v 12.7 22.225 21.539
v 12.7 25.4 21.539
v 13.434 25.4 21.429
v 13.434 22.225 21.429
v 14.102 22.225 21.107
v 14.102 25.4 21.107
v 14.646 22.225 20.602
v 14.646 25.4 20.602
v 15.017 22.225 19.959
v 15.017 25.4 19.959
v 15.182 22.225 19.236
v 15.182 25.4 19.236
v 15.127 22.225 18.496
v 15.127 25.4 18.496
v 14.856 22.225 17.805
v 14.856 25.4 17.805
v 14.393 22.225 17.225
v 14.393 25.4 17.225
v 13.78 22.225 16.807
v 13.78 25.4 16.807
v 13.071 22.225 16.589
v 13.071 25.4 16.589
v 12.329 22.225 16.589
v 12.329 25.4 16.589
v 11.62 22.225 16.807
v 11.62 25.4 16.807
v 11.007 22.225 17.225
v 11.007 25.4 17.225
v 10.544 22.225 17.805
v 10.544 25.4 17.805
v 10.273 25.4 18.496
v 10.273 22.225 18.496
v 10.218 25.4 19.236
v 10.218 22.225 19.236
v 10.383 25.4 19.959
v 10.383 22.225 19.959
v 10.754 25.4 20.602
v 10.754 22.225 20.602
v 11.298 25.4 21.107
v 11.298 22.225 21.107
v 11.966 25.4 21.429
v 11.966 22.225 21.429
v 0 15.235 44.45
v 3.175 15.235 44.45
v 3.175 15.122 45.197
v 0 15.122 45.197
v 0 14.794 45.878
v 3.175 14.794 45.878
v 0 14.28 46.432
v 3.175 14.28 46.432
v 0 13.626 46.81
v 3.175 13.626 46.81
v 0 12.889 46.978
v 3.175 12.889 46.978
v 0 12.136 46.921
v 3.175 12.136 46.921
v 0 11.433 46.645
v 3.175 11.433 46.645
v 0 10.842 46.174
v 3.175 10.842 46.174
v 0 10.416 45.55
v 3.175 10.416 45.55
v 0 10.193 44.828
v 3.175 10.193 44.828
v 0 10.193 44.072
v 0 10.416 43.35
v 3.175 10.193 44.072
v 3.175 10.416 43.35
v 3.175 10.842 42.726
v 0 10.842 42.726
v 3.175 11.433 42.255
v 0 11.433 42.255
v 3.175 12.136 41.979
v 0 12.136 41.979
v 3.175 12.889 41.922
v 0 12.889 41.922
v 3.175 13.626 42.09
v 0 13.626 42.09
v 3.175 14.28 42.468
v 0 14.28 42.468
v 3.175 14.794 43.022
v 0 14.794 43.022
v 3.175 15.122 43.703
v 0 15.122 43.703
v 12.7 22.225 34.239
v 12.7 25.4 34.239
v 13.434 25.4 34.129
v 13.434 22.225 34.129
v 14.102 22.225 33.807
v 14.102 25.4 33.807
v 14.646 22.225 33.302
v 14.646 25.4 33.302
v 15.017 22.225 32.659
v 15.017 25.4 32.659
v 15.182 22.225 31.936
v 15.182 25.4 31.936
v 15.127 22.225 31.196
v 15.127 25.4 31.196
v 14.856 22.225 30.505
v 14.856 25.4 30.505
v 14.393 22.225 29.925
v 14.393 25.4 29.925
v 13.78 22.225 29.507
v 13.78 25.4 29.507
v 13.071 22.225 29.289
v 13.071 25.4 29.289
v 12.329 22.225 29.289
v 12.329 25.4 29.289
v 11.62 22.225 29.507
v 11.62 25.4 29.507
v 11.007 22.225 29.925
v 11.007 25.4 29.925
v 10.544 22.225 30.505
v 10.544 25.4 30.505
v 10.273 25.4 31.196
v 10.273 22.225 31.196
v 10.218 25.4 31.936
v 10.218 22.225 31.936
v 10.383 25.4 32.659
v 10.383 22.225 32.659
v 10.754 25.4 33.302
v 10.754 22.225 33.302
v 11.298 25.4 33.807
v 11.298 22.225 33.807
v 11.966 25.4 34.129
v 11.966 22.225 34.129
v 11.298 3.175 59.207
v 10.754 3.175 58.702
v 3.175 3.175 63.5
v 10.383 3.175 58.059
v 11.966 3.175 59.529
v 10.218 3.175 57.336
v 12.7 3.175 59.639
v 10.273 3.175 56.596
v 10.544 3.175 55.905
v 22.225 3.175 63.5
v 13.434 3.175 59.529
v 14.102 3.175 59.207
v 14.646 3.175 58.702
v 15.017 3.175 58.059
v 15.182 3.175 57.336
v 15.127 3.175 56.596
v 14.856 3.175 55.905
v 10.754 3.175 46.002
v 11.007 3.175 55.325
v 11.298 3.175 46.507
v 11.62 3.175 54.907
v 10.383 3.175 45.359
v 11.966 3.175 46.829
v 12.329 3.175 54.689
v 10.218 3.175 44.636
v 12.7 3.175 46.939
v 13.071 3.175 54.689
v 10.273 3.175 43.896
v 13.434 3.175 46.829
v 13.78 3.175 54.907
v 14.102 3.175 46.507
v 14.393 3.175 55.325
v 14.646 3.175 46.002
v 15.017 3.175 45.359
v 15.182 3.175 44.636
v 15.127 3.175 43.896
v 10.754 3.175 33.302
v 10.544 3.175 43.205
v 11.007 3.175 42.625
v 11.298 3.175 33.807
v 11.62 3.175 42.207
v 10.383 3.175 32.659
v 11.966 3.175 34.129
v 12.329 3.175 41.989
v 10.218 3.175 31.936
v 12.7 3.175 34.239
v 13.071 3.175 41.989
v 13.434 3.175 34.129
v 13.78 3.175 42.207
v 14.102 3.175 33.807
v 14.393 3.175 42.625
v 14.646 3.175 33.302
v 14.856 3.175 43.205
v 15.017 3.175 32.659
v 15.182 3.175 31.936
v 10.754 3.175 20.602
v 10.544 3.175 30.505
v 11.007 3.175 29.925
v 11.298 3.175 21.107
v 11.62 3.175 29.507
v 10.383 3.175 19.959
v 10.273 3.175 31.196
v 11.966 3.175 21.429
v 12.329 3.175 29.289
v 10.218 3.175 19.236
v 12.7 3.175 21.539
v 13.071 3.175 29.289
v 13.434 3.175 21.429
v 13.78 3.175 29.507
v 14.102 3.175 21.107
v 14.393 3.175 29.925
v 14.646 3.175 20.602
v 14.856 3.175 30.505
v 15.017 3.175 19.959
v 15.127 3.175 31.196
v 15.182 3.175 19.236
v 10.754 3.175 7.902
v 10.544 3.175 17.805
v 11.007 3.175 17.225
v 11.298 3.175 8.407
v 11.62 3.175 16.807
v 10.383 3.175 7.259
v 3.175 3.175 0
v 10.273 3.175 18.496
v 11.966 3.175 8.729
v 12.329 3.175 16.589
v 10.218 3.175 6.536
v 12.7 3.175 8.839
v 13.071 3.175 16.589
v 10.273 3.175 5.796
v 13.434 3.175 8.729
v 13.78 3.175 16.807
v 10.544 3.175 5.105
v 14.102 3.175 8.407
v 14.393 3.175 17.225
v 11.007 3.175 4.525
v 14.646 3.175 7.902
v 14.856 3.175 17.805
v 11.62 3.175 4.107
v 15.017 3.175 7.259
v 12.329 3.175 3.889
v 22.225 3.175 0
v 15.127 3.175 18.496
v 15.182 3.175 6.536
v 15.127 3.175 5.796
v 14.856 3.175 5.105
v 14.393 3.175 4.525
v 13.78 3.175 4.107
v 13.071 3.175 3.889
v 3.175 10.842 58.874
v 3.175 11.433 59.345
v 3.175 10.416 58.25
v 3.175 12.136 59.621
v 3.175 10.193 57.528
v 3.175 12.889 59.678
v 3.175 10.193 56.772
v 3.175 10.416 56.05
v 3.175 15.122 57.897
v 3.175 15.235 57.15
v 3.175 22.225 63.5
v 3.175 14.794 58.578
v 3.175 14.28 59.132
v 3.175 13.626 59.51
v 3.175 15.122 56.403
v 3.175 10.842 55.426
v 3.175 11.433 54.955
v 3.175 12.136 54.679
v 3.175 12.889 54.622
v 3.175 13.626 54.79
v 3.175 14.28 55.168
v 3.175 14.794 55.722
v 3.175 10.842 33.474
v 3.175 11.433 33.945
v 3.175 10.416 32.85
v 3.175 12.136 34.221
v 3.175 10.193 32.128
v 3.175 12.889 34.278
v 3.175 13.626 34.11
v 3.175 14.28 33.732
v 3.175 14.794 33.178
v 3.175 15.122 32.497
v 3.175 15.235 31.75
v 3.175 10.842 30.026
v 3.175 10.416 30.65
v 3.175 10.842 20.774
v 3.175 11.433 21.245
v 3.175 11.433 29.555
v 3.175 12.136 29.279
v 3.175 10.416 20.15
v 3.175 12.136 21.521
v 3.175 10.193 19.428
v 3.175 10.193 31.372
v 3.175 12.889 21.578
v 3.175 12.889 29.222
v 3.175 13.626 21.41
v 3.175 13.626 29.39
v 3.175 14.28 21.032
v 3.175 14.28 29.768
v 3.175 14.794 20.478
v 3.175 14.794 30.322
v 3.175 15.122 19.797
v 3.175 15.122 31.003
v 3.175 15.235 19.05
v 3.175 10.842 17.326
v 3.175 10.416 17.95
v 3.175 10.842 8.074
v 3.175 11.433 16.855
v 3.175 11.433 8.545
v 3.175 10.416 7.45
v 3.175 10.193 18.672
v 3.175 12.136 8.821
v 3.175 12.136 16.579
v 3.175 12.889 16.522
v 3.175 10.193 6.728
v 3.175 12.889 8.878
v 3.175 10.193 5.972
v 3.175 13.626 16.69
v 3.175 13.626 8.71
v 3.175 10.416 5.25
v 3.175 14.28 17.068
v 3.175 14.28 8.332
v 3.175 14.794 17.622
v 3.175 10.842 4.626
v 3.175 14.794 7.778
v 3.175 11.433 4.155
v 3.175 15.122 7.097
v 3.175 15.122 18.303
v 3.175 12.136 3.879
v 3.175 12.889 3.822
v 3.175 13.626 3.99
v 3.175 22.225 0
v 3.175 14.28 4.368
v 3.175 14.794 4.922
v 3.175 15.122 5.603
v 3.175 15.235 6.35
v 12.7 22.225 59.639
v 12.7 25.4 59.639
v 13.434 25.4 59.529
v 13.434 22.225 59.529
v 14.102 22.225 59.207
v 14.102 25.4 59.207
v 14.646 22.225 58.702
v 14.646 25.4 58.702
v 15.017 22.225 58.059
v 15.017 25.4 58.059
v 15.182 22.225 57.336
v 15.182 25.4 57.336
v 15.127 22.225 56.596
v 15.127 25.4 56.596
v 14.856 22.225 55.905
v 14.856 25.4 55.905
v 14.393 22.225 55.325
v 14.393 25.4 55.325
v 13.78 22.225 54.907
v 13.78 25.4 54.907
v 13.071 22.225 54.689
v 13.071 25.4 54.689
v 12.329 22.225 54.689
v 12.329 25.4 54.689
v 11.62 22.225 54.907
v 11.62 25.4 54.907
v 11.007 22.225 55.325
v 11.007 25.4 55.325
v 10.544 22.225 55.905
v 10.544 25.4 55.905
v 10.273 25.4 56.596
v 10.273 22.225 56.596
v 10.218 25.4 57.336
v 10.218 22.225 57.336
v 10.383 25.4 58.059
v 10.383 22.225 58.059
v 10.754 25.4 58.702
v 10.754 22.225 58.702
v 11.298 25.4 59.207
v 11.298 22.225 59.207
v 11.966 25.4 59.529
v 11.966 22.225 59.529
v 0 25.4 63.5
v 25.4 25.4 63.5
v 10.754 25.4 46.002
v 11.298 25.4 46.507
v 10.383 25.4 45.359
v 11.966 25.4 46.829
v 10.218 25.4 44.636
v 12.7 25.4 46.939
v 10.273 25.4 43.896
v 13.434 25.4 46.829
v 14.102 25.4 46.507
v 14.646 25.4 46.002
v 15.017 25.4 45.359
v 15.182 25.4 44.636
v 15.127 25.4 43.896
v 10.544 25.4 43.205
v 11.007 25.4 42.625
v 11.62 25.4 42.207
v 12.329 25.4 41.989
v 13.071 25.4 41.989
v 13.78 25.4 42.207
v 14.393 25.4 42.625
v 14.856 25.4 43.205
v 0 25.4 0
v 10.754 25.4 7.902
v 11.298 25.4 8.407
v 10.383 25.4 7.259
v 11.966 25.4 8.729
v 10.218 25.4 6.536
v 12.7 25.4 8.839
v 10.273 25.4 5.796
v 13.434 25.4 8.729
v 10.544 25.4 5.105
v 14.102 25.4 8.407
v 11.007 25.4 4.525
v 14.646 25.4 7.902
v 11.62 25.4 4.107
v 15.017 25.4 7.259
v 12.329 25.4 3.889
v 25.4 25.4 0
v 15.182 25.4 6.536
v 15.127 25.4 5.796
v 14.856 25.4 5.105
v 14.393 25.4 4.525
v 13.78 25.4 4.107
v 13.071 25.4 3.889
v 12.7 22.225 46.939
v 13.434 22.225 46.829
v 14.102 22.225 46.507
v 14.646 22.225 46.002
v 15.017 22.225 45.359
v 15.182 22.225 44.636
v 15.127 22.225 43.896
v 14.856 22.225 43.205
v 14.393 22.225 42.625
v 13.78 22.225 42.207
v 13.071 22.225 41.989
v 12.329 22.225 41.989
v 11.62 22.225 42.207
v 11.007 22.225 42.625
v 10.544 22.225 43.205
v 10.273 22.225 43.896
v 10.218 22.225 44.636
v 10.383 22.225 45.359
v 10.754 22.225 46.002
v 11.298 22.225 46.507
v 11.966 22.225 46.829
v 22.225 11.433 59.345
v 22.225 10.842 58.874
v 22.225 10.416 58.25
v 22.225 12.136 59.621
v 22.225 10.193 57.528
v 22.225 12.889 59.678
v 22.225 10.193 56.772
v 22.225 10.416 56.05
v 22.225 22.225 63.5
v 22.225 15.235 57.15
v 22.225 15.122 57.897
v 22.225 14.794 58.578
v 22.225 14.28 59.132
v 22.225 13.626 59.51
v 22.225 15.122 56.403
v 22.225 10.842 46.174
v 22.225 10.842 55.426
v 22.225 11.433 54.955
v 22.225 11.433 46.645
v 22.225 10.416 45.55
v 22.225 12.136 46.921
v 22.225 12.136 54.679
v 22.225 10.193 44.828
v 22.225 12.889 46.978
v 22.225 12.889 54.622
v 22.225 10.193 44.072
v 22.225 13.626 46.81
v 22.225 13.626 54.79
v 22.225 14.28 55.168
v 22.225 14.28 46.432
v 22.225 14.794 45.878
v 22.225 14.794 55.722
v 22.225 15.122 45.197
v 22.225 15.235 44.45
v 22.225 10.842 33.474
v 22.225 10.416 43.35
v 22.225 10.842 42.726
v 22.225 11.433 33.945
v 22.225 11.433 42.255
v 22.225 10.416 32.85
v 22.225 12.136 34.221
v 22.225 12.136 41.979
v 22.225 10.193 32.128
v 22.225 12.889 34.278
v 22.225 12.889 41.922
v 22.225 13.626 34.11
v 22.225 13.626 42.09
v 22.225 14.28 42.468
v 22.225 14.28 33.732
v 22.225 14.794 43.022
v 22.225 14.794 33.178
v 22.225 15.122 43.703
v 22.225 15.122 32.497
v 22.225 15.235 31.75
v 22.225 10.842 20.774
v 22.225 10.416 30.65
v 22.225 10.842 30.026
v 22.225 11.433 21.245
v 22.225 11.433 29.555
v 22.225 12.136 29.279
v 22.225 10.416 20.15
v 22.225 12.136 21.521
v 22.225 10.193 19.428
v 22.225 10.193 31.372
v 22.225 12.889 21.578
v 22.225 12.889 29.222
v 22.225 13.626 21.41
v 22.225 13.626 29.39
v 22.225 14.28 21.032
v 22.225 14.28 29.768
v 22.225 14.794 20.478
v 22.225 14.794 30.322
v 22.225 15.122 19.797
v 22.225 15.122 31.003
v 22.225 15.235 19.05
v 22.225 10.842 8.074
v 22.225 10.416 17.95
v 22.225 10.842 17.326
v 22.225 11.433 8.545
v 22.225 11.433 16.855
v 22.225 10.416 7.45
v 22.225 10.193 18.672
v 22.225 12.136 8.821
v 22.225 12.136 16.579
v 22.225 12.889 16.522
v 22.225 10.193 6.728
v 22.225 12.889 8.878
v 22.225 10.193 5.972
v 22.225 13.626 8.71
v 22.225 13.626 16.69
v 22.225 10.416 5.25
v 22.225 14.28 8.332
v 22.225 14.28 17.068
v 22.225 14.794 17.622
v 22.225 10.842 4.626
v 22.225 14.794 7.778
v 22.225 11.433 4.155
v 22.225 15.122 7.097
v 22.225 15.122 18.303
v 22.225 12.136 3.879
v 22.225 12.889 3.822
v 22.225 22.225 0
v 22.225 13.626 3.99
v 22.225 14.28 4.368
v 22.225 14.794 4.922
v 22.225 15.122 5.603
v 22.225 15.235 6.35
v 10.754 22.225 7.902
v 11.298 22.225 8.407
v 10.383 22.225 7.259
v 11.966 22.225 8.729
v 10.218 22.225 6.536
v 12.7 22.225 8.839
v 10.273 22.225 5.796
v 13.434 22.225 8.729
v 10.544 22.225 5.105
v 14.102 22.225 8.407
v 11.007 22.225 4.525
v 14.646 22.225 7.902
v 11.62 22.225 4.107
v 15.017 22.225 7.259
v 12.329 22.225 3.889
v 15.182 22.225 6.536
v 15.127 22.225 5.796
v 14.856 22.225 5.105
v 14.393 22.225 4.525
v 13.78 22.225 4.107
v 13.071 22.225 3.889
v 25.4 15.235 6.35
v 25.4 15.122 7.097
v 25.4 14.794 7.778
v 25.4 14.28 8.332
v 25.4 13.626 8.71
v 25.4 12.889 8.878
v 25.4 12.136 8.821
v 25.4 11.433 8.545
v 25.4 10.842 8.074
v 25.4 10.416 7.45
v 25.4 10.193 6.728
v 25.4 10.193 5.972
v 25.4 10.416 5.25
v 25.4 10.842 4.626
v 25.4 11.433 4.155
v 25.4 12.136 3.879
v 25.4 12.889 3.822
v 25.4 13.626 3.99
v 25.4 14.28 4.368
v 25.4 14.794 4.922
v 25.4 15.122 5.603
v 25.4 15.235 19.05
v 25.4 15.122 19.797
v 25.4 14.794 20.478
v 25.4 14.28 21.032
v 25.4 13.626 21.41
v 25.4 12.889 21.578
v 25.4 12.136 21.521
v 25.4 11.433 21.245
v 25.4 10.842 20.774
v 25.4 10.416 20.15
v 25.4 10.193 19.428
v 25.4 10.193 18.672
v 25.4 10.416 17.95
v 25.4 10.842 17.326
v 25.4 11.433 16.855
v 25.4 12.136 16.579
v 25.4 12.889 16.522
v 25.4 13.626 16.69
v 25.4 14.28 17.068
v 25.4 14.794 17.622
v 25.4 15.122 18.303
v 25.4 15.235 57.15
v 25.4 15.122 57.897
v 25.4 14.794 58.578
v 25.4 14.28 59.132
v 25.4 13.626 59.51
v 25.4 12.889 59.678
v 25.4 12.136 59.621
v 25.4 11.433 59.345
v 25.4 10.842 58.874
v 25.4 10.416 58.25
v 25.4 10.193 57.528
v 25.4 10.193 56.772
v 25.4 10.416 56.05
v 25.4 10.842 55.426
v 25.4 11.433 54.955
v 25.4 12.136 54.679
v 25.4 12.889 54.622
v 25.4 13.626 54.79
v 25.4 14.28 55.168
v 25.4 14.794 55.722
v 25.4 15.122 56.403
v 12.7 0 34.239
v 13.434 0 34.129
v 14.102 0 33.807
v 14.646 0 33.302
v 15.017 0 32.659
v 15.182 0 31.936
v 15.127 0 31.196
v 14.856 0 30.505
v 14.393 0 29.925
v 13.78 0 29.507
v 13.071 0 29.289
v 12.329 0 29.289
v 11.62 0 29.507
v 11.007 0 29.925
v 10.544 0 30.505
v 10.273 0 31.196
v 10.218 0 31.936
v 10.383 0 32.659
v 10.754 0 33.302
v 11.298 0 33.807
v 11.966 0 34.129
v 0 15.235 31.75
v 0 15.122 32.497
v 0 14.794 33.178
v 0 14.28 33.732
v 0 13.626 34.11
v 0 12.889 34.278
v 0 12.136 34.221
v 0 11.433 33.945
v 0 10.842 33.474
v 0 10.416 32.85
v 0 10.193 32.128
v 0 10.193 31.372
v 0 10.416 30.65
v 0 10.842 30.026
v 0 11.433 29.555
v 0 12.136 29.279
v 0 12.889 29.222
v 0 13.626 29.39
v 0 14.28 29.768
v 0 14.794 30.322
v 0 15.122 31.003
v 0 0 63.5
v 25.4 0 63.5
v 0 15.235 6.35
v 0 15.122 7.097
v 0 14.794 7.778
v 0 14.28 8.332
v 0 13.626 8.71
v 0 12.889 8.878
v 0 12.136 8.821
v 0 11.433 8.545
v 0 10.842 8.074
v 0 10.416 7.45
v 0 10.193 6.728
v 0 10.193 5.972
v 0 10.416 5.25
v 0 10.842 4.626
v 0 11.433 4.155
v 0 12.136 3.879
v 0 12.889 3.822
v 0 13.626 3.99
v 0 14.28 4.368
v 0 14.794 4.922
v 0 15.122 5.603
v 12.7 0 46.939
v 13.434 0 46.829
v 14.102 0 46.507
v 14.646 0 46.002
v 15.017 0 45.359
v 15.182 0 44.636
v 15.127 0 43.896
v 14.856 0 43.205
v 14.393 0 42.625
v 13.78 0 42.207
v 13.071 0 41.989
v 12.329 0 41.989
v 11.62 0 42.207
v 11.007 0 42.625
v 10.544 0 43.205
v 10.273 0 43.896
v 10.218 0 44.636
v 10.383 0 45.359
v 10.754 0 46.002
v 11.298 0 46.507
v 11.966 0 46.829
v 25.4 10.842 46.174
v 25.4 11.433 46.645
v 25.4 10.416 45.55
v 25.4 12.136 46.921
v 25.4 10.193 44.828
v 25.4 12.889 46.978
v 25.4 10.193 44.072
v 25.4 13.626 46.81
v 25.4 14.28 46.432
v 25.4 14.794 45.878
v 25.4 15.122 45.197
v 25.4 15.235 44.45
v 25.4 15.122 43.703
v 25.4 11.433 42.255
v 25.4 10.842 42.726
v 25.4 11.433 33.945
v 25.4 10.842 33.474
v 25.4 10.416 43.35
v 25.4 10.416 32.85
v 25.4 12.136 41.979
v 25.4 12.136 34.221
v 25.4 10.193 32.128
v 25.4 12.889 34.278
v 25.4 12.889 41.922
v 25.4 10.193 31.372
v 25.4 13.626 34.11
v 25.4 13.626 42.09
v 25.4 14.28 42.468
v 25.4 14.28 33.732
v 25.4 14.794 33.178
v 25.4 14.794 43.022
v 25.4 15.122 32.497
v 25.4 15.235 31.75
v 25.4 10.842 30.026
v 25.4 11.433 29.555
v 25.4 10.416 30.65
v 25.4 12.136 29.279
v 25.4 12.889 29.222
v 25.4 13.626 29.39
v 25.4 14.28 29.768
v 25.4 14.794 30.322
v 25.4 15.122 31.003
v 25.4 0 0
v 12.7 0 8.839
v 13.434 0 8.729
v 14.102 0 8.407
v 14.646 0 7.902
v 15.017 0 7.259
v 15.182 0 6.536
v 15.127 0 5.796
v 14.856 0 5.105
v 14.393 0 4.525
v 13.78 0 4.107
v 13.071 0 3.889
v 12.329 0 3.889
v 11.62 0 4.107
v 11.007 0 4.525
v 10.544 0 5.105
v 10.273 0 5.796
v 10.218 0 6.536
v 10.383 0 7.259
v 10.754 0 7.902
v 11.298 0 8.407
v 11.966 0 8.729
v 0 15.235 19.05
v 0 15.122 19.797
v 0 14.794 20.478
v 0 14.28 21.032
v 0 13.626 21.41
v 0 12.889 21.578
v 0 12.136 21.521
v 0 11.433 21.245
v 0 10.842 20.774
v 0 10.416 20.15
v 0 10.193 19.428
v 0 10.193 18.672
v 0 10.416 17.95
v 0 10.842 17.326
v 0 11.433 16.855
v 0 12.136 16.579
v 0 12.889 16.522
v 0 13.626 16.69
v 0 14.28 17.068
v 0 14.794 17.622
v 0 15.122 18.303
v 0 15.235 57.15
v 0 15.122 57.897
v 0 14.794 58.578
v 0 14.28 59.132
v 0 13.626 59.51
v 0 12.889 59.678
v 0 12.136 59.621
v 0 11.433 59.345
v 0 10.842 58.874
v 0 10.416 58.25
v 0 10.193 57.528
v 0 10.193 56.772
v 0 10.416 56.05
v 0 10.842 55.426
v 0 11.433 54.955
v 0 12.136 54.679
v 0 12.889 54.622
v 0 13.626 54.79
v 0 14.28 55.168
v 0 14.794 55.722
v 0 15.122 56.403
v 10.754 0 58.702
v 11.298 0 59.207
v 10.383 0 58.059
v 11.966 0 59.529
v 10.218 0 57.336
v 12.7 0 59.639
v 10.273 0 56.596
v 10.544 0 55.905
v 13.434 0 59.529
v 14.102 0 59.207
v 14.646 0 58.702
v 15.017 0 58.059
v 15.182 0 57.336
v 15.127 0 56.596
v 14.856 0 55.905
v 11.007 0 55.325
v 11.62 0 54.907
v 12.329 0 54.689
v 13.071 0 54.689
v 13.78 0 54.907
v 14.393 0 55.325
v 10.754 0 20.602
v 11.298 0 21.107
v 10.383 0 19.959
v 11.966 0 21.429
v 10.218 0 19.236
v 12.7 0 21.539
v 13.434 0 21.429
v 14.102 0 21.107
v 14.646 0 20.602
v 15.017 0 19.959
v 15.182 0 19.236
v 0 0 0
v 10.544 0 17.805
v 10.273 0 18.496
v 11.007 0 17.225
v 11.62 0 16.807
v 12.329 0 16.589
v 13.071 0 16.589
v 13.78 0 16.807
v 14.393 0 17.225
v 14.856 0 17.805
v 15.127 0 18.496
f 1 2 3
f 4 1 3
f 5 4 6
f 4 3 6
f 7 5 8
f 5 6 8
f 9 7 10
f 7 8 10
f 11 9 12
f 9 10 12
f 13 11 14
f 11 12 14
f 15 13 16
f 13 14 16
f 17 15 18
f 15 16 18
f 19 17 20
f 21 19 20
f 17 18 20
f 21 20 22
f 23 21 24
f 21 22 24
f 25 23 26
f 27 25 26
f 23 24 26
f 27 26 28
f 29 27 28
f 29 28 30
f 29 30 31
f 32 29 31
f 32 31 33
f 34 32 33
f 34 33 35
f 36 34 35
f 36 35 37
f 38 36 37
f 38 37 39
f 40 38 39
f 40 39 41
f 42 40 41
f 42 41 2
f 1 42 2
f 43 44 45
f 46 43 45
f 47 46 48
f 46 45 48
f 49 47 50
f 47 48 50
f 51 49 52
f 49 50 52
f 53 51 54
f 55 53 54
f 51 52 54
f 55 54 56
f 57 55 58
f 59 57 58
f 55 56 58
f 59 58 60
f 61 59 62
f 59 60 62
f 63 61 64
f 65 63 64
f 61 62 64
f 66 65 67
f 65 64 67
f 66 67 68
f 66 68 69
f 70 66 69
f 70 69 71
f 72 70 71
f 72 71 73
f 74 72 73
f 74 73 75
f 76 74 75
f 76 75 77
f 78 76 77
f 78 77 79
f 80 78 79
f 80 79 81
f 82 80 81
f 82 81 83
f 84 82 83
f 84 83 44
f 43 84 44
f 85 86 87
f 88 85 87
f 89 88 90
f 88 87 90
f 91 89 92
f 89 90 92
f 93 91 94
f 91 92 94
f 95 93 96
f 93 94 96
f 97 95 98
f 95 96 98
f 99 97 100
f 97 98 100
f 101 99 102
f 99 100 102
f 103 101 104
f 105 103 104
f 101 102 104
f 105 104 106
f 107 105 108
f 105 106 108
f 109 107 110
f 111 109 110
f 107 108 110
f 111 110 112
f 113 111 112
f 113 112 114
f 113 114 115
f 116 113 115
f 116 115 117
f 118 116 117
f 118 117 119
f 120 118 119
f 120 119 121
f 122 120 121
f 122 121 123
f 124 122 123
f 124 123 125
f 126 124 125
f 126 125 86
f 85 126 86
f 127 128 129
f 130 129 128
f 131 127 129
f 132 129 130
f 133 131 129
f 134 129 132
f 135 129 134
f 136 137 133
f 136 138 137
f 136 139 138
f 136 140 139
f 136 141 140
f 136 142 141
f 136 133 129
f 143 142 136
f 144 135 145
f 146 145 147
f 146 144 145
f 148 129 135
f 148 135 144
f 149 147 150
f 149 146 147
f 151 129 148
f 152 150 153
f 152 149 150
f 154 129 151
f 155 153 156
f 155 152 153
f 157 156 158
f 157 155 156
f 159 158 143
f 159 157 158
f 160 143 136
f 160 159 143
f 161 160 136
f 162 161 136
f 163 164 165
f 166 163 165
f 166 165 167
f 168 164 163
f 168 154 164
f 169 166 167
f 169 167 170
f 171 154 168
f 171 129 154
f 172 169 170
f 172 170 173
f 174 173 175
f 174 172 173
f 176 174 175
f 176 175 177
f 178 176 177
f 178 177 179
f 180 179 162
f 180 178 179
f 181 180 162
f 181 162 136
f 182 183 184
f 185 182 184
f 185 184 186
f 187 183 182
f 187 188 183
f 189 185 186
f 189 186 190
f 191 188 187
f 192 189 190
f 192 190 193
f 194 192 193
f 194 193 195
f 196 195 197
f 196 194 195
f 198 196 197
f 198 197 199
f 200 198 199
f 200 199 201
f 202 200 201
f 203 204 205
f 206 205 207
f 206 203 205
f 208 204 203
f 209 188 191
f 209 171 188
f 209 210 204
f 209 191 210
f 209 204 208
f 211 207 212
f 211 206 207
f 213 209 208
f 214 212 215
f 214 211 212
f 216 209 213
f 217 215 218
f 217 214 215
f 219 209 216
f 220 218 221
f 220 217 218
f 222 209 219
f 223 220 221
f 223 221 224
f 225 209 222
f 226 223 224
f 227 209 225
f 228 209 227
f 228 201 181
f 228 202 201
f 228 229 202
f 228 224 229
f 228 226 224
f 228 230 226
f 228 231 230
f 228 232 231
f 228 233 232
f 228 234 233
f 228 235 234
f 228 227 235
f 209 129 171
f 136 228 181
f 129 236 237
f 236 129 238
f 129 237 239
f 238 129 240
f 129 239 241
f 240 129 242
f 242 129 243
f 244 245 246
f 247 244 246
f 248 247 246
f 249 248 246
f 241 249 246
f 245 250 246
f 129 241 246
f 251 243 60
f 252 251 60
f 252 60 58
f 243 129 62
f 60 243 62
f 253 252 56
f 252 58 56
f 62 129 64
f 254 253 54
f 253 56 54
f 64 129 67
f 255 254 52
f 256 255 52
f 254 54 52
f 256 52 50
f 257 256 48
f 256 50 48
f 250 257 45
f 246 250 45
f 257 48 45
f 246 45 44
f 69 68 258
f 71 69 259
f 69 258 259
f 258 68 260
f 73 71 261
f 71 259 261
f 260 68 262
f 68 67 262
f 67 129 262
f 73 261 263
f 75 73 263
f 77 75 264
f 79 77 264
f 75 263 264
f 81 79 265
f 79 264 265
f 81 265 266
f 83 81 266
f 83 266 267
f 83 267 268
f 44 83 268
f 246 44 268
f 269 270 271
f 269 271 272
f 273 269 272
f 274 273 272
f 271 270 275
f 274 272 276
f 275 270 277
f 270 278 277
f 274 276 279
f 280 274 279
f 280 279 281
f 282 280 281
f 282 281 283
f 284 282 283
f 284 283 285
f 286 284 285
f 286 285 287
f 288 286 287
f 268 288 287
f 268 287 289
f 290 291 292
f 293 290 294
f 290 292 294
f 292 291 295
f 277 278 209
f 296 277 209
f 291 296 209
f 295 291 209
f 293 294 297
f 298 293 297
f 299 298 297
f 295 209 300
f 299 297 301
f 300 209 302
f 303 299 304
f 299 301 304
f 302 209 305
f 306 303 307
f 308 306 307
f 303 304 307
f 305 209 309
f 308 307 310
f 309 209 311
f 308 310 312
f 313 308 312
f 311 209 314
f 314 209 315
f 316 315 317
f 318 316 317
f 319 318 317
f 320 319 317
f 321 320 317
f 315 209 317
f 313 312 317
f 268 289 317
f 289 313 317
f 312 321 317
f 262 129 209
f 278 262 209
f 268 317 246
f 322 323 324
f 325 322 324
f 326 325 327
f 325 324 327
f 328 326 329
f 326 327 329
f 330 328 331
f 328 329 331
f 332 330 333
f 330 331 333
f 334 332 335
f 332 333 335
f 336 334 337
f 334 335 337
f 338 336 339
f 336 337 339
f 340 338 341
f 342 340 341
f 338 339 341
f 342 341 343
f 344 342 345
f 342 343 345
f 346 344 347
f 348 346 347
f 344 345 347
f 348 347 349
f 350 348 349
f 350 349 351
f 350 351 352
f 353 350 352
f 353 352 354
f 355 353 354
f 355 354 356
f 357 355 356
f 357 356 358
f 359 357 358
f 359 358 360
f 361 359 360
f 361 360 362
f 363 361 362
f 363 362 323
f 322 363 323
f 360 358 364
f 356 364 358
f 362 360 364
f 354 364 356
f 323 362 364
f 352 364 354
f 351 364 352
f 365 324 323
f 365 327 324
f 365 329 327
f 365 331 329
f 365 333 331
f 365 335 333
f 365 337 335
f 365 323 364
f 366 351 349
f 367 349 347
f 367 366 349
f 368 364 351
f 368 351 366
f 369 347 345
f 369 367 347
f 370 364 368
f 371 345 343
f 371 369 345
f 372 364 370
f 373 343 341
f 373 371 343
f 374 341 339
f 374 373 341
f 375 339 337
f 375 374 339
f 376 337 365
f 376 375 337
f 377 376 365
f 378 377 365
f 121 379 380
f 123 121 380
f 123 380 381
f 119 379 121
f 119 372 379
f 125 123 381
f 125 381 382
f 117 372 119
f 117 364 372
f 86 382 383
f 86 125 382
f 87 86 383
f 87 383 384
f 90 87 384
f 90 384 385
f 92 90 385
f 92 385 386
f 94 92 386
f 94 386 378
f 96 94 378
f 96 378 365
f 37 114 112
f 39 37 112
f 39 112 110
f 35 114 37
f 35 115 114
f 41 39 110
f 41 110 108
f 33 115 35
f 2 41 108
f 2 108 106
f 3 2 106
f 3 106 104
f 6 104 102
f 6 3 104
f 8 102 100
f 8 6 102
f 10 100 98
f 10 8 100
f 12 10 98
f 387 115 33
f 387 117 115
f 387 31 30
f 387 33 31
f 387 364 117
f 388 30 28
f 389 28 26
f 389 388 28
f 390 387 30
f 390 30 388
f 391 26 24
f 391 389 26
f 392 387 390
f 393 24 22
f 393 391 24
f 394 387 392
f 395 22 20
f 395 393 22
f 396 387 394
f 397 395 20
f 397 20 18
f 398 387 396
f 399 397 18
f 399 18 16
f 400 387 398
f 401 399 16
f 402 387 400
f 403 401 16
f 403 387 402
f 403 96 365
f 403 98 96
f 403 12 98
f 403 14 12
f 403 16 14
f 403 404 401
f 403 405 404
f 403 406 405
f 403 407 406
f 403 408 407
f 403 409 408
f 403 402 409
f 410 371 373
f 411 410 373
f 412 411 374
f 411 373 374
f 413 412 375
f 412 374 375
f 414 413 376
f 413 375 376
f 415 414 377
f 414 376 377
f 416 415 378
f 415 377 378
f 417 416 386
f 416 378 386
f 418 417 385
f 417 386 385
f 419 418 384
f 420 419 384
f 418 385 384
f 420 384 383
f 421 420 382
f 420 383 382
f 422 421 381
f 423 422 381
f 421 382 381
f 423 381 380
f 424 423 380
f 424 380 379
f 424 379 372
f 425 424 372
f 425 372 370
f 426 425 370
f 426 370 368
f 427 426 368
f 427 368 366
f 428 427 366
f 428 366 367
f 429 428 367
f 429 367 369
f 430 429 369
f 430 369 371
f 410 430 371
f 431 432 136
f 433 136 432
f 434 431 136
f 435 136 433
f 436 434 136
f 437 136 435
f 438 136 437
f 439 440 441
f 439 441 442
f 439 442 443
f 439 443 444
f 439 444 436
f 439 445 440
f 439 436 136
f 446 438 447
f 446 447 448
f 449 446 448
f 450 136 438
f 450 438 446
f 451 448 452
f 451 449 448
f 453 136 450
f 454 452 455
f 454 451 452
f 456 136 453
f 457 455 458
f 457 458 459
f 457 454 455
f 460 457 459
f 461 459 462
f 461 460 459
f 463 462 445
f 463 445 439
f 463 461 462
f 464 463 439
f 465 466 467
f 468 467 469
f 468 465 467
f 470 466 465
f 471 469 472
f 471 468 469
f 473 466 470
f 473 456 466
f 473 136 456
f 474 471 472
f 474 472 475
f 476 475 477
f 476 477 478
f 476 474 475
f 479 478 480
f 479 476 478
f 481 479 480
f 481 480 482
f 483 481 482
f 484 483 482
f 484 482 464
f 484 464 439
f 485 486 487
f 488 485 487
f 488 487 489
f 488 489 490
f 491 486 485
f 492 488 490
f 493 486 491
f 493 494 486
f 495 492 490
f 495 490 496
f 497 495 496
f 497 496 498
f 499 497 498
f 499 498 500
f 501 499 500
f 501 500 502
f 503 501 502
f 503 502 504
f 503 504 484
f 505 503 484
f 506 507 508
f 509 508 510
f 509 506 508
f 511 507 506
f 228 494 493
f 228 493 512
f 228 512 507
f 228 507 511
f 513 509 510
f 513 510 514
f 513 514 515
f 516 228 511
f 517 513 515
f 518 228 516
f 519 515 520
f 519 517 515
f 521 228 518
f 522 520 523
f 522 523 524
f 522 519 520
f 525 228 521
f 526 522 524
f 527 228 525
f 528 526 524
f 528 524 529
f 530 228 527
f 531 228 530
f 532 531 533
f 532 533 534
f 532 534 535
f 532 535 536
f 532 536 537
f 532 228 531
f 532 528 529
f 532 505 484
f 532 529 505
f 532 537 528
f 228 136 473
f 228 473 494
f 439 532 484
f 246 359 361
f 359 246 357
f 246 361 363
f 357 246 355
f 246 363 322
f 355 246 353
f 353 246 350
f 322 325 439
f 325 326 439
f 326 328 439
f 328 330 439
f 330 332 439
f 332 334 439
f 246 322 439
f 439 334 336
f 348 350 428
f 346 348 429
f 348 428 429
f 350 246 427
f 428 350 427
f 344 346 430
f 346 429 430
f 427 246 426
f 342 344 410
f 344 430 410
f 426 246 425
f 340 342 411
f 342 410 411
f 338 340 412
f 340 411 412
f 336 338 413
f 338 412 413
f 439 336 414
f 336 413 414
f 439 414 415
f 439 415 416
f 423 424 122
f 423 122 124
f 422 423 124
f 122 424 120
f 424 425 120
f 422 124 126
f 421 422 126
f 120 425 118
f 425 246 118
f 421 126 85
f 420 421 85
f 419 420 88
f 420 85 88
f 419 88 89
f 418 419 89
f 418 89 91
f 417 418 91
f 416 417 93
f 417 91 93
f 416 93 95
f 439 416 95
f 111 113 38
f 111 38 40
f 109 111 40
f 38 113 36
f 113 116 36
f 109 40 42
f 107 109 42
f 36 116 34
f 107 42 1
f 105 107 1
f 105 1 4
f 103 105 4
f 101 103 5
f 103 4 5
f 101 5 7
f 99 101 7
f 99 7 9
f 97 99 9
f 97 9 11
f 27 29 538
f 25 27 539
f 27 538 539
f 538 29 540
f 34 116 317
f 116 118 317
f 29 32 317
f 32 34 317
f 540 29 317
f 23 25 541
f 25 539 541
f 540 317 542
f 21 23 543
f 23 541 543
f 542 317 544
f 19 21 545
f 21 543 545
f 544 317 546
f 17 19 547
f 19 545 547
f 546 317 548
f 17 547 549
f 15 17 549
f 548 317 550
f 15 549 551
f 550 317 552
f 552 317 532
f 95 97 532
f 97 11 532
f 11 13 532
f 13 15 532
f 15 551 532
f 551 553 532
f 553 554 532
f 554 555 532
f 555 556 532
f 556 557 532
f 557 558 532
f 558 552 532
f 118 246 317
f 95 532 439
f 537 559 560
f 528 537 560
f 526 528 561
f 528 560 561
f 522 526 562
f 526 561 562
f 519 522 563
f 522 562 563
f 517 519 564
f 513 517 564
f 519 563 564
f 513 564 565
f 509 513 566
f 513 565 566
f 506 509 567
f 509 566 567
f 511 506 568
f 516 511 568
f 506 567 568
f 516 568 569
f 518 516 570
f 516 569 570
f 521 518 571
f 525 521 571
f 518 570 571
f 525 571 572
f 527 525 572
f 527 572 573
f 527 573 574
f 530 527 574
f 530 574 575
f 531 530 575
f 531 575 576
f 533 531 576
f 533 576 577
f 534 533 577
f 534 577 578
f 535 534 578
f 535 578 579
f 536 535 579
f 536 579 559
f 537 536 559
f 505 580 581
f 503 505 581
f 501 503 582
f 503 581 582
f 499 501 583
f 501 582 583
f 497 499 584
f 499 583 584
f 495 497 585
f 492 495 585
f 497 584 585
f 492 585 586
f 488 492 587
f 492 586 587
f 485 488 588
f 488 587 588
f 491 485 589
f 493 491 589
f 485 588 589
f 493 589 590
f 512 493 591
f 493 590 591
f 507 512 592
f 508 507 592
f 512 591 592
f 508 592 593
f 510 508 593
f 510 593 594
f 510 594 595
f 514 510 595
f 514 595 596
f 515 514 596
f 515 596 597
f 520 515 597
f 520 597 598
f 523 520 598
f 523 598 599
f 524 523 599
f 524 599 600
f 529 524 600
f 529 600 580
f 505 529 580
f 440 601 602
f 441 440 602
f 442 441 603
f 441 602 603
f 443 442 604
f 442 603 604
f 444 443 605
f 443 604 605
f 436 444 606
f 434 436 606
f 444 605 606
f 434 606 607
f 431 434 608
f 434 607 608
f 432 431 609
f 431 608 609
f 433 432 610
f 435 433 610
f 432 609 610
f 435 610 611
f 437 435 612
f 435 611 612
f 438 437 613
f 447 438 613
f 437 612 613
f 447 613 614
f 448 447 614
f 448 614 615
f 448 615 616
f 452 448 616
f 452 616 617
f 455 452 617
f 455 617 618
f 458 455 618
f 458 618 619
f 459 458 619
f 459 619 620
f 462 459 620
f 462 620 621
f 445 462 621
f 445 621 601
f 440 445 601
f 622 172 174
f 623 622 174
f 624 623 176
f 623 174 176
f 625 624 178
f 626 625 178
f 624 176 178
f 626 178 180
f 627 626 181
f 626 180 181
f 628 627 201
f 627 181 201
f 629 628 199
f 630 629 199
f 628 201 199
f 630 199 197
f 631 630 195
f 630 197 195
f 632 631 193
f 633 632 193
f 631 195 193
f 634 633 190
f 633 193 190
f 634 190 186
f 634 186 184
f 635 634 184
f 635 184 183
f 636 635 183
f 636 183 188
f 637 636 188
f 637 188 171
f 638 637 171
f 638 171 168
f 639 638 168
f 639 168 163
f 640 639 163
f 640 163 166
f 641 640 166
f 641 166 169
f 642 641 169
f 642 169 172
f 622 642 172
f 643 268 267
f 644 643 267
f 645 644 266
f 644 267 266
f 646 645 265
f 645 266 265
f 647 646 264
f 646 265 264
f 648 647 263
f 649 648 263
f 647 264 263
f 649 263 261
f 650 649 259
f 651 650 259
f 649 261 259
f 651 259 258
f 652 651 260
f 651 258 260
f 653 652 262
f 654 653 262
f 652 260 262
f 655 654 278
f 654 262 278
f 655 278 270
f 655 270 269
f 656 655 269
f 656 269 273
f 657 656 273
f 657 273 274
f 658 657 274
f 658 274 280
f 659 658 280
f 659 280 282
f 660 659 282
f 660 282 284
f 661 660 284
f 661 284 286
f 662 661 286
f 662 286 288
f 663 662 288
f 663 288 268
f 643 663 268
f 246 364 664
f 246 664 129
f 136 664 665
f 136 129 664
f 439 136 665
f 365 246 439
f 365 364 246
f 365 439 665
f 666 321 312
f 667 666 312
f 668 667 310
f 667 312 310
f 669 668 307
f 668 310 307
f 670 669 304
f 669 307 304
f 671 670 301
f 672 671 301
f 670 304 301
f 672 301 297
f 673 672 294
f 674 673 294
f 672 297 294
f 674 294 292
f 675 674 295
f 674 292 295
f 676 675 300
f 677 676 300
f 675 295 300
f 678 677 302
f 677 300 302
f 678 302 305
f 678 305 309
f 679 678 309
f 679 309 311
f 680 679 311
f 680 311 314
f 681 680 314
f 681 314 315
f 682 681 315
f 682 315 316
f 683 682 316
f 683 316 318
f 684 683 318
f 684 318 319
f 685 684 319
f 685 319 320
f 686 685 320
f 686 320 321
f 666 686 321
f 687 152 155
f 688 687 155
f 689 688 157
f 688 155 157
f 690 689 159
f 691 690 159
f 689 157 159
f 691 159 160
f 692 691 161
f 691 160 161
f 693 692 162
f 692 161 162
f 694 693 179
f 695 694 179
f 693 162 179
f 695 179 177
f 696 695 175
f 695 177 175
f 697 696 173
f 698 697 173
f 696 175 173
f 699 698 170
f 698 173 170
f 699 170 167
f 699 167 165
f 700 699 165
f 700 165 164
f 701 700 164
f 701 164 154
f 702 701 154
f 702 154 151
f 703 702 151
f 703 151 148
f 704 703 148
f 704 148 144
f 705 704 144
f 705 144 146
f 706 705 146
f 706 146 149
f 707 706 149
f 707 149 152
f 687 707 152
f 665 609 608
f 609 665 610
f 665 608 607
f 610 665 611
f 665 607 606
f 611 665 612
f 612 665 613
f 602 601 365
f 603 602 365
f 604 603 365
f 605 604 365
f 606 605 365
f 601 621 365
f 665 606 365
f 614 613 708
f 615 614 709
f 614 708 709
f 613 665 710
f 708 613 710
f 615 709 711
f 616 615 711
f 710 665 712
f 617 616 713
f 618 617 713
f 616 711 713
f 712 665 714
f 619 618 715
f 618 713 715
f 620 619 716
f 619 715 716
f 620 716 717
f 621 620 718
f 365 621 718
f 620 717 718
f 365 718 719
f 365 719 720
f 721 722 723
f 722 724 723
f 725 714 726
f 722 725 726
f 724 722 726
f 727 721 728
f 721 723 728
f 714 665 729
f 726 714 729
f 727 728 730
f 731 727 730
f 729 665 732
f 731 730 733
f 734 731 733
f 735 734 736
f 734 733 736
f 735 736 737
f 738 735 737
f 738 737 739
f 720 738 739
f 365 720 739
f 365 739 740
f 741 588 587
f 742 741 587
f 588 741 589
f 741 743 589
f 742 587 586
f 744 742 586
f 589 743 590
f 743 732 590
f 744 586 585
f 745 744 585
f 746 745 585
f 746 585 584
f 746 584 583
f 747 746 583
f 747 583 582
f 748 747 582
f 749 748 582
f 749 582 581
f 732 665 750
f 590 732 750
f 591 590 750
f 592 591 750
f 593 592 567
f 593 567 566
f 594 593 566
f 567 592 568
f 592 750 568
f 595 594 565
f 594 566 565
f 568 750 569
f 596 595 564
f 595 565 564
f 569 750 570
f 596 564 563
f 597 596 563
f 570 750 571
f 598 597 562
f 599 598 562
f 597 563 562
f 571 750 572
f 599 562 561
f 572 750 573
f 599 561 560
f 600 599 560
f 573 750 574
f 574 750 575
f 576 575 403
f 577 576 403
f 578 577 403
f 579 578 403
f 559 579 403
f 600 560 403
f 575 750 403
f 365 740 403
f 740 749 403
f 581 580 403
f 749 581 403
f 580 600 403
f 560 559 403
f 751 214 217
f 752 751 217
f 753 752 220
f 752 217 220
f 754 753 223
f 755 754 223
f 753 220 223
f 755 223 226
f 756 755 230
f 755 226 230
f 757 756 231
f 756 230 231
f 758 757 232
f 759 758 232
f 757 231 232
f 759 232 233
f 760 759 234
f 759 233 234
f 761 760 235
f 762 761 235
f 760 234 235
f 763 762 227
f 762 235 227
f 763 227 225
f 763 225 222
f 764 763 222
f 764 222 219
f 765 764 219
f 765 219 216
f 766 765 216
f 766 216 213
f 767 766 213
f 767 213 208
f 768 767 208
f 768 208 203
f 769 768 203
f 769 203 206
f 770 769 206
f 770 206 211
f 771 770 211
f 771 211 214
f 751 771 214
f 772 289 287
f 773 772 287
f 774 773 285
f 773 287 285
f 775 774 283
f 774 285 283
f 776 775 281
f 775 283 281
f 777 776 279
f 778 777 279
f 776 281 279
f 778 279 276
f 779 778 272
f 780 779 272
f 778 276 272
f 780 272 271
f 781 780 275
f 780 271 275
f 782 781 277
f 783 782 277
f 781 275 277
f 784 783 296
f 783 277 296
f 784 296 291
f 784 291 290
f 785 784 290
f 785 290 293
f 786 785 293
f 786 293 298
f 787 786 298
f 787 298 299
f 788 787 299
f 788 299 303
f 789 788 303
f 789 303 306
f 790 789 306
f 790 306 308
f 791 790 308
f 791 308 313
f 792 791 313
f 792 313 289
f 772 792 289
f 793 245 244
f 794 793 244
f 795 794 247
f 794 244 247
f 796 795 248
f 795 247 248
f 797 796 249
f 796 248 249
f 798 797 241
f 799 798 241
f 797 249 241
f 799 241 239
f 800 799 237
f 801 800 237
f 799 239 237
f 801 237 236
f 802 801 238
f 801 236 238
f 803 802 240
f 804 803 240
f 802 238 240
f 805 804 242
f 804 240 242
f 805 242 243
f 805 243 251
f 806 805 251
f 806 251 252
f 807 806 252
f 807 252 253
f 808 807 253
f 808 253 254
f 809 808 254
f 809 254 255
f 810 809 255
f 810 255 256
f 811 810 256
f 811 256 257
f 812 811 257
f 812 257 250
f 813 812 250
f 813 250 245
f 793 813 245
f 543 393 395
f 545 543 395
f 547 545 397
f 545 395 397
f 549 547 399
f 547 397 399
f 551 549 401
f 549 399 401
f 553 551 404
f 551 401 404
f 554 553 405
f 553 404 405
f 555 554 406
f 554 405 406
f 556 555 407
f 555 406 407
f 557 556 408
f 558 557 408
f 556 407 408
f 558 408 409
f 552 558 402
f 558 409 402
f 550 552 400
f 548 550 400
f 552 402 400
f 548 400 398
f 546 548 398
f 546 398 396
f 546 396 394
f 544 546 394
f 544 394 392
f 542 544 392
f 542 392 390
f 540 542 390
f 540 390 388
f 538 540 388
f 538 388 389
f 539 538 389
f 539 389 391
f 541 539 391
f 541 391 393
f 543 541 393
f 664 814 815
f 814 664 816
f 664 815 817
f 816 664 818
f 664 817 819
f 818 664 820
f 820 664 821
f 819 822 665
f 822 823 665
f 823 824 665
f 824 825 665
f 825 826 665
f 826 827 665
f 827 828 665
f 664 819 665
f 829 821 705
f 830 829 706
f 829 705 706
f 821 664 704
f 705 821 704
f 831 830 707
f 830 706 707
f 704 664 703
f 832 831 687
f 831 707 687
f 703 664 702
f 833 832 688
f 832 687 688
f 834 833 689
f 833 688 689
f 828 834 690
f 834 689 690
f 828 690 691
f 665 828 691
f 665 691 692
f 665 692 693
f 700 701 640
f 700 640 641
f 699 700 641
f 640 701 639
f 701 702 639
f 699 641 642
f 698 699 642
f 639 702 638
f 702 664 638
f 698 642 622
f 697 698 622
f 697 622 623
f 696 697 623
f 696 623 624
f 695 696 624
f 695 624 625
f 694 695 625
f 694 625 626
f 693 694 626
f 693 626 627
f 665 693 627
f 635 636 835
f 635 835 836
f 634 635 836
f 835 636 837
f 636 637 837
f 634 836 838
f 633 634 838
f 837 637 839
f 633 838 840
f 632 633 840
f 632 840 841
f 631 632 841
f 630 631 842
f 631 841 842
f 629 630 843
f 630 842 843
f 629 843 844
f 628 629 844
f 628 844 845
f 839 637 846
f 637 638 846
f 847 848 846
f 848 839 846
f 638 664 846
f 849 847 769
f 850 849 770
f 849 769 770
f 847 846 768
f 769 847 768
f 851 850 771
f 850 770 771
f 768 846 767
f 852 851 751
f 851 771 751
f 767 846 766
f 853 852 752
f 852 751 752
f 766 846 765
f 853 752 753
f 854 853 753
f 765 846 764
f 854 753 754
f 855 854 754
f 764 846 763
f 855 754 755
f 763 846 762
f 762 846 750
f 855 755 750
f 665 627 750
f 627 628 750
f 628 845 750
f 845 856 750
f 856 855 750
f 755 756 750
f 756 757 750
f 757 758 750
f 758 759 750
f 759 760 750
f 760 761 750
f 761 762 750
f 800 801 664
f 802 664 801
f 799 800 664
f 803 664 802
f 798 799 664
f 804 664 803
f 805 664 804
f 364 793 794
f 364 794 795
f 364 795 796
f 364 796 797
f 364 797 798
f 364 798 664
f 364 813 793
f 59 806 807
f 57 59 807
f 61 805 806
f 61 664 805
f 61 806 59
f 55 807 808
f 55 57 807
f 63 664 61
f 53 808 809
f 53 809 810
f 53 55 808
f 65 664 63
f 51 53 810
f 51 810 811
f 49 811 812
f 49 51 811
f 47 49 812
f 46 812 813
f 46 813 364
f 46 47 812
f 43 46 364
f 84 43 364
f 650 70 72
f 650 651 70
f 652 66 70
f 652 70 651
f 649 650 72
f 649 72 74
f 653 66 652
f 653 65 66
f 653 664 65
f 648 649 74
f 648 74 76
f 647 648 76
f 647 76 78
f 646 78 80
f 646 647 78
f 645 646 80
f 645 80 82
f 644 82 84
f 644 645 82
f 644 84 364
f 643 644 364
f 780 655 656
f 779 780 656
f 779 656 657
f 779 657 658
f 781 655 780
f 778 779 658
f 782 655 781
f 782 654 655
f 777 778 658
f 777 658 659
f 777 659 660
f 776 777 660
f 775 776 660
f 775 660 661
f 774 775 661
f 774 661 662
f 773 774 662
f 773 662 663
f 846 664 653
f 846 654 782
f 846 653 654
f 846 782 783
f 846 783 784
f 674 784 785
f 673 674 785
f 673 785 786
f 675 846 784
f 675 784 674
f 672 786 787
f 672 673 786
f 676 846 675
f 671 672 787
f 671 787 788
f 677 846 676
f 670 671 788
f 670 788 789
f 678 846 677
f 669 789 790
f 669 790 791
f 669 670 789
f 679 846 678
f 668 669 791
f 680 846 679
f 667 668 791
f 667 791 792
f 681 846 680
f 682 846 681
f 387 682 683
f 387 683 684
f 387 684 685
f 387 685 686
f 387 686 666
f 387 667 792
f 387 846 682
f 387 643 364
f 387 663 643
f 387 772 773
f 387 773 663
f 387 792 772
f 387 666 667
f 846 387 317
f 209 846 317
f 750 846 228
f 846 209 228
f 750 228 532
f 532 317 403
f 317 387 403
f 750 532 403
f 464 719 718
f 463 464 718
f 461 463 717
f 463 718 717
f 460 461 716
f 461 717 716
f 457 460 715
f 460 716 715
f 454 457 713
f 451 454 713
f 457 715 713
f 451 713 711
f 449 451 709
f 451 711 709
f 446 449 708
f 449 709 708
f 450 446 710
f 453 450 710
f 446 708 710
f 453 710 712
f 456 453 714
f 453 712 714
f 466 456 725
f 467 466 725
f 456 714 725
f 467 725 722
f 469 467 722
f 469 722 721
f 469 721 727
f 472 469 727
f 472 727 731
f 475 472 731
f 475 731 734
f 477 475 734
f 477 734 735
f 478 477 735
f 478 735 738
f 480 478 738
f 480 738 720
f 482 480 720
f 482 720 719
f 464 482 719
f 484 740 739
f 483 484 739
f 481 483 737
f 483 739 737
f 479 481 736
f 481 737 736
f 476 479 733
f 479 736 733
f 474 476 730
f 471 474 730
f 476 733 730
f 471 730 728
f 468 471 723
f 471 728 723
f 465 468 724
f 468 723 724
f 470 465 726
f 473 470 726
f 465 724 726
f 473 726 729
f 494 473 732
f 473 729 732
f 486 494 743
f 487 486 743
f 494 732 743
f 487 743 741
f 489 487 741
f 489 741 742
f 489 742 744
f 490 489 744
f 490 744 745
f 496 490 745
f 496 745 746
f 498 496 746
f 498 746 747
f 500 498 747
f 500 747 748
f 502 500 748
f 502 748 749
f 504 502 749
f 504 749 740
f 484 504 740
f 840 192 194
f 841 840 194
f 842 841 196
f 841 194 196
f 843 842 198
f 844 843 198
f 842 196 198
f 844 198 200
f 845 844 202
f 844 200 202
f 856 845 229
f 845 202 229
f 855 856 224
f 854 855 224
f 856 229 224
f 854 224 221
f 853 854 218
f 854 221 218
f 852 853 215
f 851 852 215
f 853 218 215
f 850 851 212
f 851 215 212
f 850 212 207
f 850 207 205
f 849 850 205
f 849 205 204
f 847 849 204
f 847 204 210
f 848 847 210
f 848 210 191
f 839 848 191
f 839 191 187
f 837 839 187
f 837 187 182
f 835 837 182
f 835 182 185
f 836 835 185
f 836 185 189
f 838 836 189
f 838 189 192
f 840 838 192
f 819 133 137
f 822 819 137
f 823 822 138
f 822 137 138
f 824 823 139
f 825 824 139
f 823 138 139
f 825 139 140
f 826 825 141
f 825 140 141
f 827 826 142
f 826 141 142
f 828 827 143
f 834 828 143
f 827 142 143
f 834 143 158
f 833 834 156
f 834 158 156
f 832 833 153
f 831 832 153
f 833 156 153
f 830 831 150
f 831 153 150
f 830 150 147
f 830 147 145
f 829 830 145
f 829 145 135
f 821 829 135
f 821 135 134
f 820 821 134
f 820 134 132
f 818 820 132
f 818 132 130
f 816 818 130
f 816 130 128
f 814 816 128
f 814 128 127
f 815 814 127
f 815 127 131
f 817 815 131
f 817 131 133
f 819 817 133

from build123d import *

# Parameters (mm, degrees)
SKETCH1_W           = 25.4
SKETCH1_H           = 25.4
BOSS_EXTRUDE1_DEPTH = 63.5
SHELL1_T            = -3.175
SKETCH2_R           = 2.4892
CUT_EXTRUDE1_DEPTH  = 63.5
SKETCH3_R           = 2.53492
CUT_EXTRUDE2_DEPTH  = 63.5


with BuildPart() as part:
    # Sketch1 → Boss-Extrude1 (new body)
    with BuildSketch(Plane.XY):
        with Locations((12.7, 12.7)):
            Rectangle(SKETCH1_W, SKETCH1_H)
    extrude(amount=BOSS_EXTRUDE1_DEPTH)

    # Shell1
    shell1_openings = [part.faces().sort_by_distance(p)[0] for p in [
        (12.7, 12.7, 63.5),
        (12.7, 12.7, 0),
    ]]
    offset(amount=SHELL1_T, openings=shell1_openings, kind=Kind.INTERSECTION)

    # Sketch2 → Cut-Extrude1 (cut)
    with BuildSketch(Plane(origin=(0, 25.4, 0), x_dir=(1, 0, 0), z_dir=(0, 1, 0))):
        with Locations(Location((12.7, -6.35, 0), (0, 0, 270))):
            Circle(SKETCH2_R)
        with Locations(Location((12.7, -19.05, 0), (0, 0, 270))):
            Circle(SKETCH2_R)
        with Locations(Location((12.7, -31.75, 0), (0, 0, 270))):
            Circle(SKETCH2_R)
        with Locations(Location((12.7, -44.45, 0), (0, 0, 270))):
            Circle(SKETCH2_R)
        with Locations(Location((12.7, -57.15, 0), (0, 0, 270))):
            Circle(SKETCH2_R)
    extrude(amount=-CUT_EXTRUDE1_DEPTH, mode=Mode.SUBTRACT)

    # Sketch3 → Cut-Extrude2 (cut)
    with BuildSketch(Plane(origin=(25.4, 0, 0), x_dir=(0, 0, -1), z_dir=(1, 0, 0))):
        with Locations(Location((-57.15, 12.7, 0), (0, 0, 90))):
            Circle(SKETCH3_R)
        with Locations(Location((-44.45, 12.7, 0), (0, 0, 90))):
            Circle(SKETCH3_R)
        with Locations(Location((-31.75, 12.7, 0), (0, 0, 90))):
            Circle(SKETCH3_R)
        with Locations(Location((-19.05, 12.7, 0), (0, 0, 90))):
            Circle(SKETCH3_R)
        with Locations(Location((-6.35, 12.7, 0), (0, 0, 90))):
            Circle(SKETCH3_R)
    extrude(amount=-CUT_EXTRUDE2_DEPTH, mode=Mode.SUBTRACT)


solid = part.part
